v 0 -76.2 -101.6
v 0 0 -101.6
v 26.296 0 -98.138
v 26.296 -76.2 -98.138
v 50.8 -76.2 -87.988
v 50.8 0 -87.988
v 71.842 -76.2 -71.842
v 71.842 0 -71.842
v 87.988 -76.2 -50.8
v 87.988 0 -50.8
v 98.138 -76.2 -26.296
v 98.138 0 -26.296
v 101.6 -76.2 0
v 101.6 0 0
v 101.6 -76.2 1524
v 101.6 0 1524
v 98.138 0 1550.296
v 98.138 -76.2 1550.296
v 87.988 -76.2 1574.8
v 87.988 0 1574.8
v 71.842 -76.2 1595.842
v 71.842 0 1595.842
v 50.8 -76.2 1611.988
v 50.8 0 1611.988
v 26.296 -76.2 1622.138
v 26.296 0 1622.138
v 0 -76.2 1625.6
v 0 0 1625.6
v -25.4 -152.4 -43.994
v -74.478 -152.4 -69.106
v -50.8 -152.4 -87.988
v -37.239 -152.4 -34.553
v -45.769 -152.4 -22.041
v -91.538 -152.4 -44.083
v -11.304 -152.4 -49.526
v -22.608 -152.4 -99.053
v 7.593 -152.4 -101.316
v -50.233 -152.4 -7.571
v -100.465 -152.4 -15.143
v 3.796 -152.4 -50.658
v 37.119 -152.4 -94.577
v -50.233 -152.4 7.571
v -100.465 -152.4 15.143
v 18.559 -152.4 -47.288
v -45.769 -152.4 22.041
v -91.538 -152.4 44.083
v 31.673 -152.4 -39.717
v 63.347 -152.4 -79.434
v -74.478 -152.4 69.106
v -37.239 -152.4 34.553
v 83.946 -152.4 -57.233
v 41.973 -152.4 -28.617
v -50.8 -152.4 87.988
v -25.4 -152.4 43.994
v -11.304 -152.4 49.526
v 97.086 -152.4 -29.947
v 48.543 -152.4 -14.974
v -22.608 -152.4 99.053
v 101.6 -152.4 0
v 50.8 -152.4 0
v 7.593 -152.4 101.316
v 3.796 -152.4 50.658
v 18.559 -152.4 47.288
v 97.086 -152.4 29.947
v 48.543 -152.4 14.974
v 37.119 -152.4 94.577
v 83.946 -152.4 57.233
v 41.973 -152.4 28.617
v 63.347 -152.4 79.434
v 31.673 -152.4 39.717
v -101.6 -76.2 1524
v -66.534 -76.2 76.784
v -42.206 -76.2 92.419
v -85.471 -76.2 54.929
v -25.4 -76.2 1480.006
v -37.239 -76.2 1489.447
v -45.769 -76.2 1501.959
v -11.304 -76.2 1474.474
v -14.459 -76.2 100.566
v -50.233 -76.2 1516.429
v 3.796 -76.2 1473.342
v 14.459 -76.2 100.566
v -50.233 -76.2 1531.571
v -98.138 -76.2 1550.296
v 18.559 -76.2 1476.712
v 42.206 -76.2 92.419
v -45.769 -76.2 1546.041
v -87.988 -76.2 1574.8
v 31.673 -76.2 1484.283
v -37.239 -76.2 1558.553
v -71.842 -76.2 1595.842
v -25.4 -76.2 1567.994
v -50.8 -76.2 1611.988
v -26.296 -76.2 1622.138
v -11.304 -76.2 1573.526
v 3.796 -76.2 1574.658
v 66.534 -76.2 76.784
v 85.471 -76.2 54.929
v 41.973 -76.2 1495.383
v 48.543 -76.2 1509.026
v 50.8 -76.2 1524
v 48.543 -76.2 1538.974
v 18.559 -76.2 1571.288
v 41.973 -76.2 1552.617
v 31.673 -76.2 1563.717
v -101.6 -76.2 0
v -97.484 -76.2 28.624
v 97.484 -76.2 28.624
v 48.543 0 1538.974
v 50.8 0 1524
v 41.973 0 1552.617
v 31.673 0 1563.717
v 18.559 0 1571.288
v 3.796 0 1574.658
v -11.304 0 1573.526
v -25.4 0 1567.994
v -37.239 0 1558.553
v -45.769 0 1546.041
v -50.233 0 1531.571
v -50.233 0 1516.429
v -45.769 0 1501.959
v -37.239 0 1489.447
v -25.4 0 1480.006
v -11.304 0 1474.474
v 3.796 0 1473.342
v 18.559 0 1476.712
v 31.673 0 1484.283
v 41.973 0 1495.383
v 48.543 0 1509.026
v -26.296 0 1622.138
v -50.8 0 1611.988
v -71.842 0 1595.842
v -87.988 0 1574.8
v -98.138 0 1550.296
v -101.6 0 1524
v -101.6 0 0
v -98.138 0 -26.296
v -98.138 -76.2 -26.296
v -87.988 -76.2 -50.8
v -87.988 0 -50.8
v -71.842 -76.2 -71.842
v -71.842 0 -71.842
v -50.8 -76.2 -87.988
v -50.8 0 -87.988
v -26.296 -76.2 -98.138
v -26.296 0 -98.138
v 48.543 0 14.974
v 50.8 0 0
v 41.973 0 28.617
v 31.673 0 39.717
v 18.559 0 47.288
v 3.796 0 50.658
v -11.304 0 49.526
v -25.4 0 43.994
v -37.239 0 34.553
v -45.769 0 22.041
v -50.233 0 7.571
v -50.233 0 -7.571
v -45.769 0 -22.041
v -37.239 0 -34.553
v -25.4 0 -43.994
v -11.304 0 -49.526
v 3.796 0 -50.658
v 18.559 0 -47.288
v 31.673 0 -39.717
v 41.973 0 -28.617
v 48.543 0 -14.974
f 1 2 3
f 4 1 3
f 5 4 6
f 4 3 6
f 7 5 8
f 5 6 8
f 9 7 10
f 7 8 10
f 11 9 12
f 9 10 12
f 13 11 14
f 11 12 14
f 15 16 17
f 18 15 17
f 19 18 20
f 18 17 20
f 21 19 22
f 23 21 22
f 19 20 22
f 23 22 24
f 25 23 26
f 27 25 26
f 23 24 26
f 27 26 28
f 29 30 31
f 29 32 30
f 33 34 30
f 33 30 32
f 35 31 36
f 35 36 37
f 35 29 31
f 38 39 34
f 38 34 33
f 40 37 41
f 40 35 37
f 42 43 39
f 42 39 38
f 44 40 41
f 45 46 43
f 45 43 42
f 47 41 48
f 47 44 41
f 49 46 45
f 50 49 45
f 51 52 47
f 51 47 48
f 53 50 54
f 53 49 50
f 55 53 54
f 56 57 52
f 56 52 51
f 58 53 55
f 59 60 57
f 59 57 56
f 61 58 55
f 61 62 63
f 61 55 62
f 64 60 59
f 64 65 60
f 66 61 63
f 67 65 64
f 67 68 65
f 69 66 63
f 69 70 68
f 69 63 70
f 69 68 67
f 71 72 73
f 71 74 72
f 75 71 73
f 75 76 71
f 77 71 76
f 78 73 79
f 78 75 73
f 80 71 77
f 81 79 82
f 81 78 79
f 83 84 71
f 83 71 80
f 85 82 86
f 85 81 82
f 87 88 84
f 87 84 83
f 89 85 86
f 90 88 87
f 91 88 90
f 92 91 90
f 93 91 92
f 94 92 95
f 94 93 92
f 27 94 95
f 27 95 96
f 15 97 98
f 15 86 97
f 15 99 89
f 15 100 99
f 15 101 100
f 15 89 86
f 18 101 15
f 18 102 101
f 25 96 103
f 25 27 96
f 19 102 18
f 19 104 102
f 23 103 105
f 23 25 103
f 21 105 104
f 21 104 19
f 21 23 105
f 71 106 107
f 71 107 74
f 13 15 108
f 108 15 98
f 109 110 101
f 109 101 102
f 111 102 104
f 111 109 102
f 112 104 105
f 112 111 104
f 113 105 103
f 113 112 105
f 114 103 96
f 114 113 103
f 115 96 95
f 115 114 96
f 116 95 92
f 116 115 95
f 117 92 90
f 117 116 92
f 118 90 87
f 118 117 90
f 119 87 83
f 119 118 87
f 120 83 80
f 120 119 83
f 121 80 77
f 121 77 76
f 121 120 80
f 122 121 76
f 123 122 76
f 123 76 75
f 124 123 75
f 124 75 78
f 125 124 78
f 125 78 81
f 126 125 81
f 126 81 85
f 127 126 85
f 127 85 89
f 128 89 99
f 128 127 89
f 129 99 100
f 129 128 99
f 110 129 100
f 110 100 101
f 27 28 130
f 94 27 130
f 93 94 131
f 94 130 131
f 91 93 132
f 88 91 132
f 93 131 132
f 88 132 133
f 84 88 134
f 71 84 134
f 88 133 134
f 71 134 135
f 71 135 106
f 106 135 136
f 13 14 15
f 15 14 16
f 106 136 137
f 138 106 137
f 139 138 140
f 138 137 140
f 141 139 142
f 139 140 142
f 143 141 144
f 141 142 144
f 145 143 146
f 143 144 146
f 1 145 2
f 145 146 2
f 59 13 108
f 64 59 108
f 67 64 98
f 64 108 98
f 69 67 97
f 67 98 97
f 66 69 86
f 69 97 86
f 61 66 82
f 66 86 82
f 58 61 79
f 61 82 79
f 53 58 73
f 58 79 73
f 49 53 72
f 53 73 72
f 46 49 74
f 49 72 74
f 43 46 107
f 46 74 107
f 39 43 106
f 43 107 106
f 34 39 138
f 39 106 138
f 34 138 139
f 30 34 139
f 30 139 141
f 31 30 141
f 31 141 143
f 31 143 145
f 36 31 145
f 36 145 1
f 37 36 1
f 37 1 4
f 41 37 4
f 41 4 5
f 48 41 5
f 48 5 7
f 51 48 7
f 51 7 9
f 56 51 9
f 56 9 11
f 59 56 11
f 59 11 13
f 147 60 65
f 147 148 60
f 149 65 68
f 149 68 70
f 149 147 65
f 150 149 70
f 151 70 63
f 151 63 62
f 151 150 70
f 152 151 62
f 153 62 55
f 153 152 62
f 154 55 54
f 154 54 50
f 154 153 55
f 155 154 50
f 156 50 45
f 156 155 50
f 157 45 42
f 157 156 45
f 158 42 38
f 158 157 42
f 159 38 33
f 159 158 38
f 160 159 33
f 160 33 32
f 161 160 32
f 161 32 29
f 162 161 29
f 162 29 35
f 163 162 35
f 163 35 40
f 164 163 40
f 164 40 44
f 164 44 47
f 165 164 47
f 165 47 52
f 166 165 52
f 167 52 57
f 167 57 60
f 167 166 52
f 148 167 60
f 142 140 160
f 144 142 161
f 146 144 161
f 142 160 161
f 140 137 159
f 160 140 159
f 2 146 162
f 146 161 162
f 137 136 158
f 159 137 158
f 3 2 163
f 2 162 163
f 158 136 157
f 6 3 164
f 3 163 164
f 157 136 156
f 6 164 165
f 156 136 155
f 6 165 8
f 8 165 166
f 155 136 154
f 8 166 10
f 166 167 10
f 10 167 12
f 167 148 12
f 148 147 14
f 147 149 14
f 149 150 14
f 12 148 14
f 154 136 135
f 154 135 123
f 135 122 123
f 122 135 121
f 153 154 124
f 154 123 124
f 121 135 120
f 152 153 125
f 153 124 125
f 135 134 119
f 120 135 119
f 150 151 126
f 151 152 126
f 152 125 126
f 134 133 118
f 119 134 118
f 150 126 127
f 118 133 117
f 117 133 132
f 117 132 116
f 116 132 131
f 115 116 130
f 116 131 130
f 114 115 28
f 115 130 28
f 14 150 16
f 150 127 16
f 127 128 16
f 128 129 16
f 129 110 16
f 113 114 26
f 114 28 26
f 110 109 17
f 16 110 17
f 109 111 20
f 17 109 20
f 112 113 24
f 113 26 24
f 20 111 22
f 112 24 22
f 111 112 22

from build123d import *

# Parameters (mm, degrees)
F0_R     = 50.8
F1_DEPTH = 76.2
F2_R     = 101.6
F2_R_2   = 50.8
F3_DEPTH = 76.2


with BuildPart() as f1:
    # F0 (on Front) → F1 (new body)
    with BuildSketch(Plane.XZ):
        with BuildLine():
            Line((-101.6, 1524), (-101.6, 0))
            ThreePointArc((-101.6, 0), (-71.842049, -71.842049), (0, -101.6))
            ThreePointArc((0, -101.6), (71.842049, -71.842049), (101.6, 0))
            Line((101.6, 0), (101.6, 1524))
            ThreePointArc((101.6, 1524), (71.842049, 1595.842049), (0, 1625.6))
            ThreePointArc((0, 1625.6), (-71.842049, 1595.842049), (-101.6, 1524))
        make_face()
        Circle(F0_R, mode=Mode.SUBTRACT)
        with Locations((0, 1524)):
            Circle(F0_R, mode=Mode.SUBTRACT)
    extrude(amount=F1_DEPTH)

    # F2 (on face) → F3 (join)
    with BuildSketch(Plane.XZ.offset(76.2)):
        Circle(F2_R)
        Circle(F2_R_2, mode=Mode.SUBTRACT)
    extrude(amount=F3_DEPTH)


solid = f1.part
